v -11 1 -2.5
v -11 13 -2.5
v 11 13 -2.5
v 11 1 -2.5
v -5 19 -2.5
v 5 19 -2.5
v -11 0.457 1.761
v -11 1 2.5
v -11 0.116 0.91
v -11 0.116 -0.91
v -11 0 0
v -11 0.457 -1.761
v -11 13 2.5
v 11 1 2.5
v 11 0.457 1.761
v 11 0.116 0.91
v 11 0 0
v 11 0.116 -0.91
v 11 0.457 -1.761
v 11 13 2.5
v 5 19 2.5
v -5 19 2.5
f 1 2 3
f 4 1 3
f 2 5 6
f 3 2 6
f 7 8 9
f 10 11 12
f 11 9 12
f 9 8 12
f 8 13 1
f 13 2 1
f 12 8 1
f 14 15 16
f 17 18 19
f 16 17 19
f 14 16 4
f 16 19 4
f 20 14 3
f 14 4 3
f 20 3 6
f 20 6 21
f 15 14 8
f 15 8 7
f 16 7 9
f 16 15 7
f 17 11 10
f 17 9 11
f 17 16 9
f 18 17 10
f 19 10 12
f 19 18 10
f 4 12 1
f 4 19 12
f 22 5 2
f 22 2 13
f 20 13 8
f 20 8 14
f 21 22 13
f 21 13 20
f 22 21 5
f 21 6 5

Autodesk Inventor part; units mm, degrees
ref_plane "YZ Plane" through (0, 0, 0) normal (1, 0, 0) x (0, 1, 0)
ref_plane "XZ Plane" through (0, 0, 0) normal (0, 1, 0) x (-1, 0, 0)
ref_plane "XY Plane" through (0, 0, 0) normal (0, 0, 1) x (1, 0, 0)
sketch "Sketch1" plane through (0, 0, 0) normal (0, 0, 1) x (1, 0, 0)
  line L0 (-11, 0) -> (11, 0)
  line L1 (11, 0) -> (11, 19)
  line L2 (11, 19) -> (-11, 19)
  line L3 (-11, 19) -> (-11, 0)
  point P0 (0, 0)
  point P1 (0, 0)
  dimension "d0" = 22
  dimension "d1" = 19
extrude "Extrusion1" add sketch "Sketch1" along normal mid plane 5
chamfer "Chamfer1" distance 6 angle 45 2 edges at (-11, 19, 0) (11, 19, 0)
sketch "Sketch2" plane through (11, 0, 2.5) normal (1, 0, 0) x (0, 0, -1)
  line L0 (0, 0) -> (0, 13) projected
  line L1 (5, 13) -> (5, 0) projected
  arc A0 (0, 1) -> (5, 1) centre (2.5, 3.625) ccw
  line L2 (0, 0) -> (5, 0) projected
  point P0 (2.5, 0)
  point P1 (2.5, 0)
  dimension "d7" = 1
extrude "Extrusion2" cut sketch "Sketch2" against normal through all
properties material "Steel"
